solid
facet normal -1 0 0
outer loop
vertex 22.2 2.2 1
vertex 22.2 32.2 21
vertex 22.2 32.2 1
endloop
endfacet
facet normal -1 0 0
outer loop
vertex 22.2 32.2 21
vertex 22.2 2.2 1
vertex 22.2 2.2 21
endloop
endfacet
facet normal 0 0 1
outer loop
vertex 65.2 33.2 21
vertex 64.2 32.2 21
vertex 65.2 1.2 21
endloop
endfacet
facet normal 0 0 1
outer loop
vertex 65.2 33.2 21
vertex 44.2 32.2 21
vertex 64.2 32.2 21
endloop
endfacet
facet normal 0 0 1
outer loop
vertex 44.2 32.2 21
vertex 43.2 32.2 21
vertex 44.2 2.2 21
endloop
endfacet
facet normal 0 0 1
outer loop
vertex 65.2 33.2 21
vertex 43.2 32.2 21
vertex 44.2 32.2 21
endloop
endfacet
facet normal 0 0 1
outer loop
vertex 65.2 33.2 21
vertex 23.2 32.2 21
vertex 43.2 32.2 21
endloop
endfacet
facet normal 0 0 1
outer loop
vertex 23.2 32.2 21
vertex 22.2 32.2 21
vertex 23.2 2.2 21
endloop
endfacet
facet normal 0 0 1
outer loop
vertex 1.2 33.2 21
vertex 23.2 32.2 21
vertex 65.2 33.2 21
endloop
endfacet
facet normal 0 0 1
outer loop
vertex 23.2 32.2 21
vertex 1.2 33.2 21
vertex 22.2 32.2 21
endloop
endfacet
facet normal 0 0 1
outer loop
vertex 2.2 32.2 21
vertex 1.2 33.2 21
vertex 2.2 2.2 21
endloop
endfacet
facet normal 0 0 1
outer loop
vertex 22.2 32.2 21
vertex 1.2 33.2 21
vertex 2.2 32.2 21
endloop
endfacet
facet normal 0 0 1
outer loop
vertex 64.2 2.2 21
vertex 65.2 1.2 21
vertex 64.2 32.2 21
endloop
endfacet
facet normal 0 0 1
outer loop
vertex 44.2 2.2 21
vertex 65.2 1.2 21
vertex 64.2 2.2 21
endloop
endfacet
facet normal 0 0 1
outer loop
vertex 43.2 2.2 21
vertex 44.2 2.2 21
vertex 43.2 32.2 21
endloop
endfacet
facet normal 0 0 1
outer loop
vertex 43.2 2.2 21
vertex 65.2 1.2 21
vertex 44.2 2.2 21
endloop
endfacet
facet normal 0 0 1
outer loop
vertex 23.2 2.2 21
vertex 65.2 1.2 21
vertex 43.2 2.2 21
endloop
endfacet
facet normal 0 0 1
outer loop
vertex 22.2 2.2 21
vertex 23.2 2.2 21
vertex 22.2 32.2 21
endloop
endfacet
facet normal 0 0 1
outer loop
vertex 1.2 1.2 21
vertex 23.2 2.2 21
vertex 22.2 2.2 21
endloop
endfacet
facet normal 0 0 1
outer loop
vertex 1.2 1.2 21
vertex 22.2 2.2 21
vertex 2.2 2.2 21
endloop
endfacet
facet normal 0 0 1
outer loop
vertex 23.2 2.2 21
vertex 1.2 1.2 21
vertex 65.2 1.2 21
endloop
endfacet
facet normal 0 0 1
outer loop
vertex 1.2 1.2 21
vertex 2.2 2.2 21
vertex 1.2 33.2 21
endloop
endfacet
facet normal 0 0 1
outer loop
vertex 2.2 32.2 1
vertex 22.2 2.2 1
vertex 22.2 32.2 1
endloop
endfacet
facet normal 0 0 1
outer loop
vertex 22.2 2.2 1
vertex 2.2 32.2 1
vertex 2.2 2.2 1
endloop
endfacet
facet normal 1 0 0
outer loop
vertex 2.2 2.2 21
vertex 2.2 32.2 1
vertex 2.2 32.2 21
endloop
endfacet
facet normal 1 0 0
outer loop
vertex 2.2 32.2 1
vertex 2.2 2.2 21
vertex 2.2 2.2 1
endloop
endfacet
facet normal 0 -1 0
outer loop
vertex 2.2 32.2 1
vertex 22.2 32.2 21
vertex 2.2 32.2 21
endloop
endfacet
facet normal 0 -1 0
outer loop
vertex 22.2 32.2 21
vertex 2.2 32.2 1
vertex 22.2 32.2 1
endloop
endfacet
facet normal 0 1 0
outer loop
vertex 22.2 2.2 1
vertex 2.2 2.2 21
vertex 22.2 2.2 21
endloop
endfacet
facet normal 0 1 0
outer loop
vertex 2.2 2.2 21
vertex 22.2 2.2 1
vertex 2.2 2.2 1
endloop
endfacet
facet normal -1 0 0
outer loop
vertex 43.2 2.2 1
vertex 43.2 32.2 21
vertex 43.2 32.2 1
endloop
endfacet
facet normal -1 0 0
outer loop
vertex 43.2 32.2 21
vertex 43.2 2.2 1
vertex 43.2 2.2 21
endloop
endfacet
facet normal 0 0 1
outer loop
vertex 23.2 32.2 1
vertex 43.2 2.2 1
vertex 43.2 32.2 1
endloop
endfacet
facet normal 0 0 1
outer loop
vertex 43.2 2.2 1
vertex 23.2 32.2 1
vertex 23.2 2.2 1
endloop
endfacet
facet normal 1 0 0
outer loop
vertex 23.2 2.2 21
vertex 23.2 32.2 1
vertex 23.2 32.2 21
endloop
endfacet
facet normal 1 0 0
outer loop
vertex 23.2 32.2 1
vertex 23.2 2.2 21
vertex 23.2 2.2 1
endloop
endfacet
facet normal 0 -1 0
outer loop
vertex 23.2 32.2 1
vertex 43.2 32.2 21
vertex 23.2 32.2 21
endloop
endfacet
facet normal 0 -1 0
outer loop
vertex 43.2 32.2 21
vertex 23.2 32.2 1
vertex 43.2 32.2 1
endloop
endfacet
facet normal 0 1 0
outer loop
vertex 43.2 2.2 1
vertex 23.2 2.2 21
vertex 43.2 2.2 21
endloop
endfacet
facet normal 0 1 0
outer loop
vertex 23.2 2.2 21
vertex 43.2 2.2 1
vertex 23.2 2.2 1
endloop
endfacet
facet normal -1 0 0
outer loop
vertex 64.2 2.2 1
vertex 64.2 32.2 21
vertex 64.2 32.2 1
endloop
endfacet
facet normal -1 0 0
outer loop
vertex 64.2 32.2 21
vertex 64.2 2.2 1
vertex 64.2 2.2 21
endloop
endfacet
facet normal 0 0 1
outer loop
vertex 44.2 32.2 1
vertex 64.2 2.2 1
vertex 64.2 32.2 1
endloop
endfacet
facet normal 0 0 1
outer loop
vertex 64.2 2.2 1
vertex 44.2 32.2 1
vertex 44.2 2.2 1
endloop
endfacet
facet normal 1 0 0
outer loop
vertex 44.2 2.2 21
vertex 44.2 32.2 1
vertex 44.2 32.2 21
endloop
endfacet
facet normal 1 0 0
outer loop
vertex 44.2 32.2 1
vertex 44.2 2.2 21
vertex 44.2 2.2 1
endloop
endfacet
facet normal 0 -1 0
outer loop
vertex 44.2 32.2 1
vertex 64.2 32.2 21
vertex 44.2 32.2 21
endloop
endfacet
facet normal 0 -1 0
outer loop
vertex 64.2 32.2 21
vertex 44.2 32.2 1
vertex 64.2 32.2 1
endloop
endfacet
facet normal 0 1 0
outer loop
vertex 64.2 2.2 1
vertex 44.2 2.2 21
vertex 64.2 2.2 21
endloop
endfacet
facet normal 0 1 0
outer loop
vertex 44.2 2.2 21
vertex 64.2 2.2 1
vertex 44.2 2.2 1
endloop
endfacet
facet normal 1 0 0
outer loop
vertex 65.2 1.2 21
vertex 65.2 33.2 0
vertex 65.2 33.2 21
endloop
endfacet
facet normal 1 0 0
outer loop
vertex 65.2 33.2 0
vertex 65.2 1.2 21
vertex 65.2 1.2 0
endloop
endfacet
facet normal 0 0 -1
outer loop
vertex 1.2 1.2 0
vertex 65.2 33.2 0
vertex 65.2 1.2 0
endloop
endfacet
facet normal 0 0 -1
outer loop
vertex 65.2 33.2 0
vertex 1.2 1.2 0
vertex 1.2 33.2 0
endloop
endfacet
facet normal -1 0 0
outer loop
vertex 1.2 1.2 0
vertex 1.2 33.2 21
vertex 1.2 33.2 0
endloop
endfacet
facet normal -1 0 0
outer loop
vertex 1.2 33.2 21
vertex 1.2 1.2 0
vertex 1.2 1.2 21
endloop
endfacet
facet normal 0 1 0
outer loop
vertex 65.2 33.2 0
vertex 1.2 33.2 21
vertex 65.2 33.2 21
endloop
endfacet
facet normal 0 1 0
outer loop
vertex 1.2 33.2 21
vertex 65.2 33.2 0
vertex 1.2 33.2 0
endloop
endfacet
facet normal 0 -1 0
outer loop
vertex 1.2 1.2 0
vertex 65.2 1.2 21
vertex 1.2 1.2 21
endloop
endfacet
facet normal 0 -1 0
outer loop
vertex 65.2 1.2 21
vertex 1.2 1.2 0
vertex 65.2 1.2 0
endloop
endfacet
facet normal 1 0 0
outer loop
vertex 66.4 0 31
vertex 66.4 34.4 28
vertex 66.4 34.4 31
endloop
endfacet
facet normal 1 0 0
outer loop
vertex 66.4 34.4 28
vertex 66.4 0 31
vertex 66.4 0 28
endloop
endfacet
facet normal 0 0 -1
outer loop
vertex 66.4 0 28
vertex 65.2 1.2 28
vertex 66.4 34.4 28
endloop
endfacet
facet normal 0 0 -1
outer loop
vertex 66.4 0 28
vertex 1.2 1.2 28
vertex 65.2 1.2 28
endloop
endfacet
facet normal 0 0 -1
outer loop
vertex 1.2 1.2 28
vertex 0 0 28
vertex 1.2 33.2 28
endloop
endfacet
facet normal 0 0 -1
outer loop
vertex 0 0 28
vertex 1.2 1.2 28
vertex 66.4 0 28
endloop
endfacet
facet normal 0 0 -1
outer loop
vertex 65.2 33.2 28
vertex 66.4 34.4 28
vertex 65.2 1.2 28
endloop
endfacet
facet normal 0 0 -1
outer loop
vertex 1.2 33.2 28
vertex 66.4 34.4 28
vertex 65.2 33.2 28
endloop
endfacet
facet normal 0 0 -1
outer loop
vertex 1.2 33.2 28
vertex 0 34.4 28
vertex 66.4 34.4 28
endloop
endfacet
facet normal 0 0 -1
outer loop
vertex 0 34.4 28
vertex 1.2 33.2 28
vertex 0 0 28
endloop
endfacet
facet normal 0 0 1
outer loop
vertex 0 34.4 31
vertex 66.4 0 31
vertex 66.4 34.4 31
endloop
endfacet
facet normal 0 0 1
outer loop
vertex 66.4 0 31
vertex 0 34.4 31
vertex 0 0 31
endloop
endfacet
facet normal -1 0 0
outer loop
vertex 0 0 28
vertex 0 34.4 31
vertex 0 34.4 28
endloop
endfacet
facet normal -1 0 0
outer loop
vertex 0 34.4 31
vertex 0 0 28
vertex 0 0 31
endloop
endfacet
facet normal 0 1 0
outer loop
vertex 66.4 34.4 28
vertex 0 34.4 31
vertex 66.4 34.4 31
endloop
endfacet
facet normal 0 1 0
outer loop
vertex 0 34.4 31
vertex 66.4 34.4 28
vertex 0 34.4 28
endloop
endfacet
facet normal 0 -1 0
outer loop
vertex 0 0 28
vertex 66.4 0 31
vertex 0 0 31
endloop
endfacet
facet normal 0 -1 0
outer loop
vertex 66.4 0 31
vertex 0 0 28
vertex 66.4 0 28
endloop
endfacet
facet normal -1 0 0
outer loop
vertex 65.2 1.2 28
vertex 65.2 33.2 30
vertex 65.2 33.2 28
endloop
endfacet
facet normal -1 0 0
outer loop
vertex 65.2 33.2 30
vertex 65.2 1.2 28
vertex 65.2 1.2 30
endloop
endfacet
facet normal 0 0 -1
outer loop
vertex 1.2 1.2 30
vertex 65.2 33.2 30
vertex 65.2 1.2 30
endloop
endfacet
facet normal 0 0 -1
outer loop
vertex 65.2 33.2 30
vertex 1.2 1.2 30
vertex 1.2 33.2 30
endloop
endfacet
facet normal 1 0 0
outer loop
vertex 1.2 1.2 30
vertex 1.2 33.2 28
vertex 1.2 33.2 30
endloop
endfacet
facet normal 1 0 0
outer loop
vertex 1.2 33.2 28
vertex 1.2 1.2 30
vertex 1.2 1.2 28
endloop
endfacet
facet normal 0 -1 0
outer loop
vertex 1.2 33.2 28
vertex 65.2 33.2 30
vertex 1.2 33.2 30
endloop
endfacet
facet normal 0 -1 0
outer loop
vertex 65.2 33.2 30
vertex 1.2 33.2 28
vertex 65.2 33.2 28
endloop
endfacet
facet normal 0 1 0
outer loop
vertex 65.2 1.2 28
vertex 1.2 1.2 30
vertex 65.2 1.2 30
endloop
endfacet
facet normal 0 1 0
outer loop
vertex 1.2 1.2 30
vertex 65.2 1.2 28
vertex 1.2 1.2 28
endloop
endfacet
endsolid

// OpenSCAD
// file: utils.scad
function boxXSize(count, size, innerThickness, outerThickness) = count * (size + innerThickness) - innerThickness + 2 * outerThickness;

function boxYSize(count, size, innerThickness, outerThickness) = count * (size + innerThickness) - innerThickness + 2 * outerThickness;

function boxZSize(size, bottomThickness) = bottomThickness + size;
// file: config.scad
cellSize = [20, 30, 20];
cellsCount = [3, 1];

// ---

innerThickness = 1;
outerThickness = 1;
coverThickness = 1;
bottomThickness = 1;

coverOverlap = 2;
coverGap = 0.2;

$fa = 1;
$fs = 0.2;
// file: Cover.scad
include <config.scad>;

use <utils.scad>;

module Cover(boxSize, overlap = coverOverlap, gap = coverGap, thickness = coverThickness) {
    
    coverSize = [
        boxSize.x + 2*coverThickness + 2*coverGap,
        boxSize.y + 2*coverThickness + 2*coverGap,
        coverThickness + coverOverlap        
    ];

    difference() {
        cube(coverSize);
        translate([thickness + gap, thickness + gap, thickness]) cube([boxSize.x, boxSize.y, coverOverlap]);
    }
}

boxSize = [
    boxXSize(cellsCount.x, cellSize.x, innerThickness, outerThickness),
    boxYSize(cellsCount.y, cellSize.y, innerThickness, outerThickness)
];
Cover(boxSize);
// file: StorageBox.scad
include <config.scad>;

use <utils.scad>;

module StorageBox(cellsCount, cellSize, innerThickness = innerThickness, outerThickness = outerThickness, bottomThickness = bottomThickness) {
    
    boxSize = [
        boxXSize(cellsCount.x, cellSize.x, innerThickness, outerThickness),
        boxYSize(cellsCount.y, cellSize.y, innerThickness, outerThickness),
        boxZSize(cellSize.z, bottomThickness)
    ];

    difference() {
        cube(boxSize);    // Outer bound

        union() {
            for (i = [1:cellsCount.x]) {
                for (j = [1:cellsCount.y]) {
                    x = outerThickness + (i-1) * (cellSize.x + innerThickness);
                    y = outerThickness + (j-1) * (cellSize.y + innerThickness);
                    z = bottomThickness;

                    translate([x, y, z]) cube([cellSize.x, cellSize.y, cellSize.z]);    // Cell
                }
            }
        }
    }
}

StorageBox(cellsCount, cellSize);
// main file
use <StorageBox.scad>;
use <Cover.scad>;

include <config.scad>;
use <utils.scad>;

translate([outerThickness + coverGap, outerThickness + coverGap, 0]) StorageBox(cellsCount, cellSize);

translate([0, 0, boxZSize(cellSize.z, bottomThickness) + (1-$t)*10]) {
    boxSize = [
        boxXSize(cellsCount.x, cellSize.x, innerThickness, outerThickness),
        boxYSize(cellsCount.y, cellSize.y, innerThickness, outerThickness)
    ];
    mirror([0, 0, 1]) Cover(boxSize);
}
